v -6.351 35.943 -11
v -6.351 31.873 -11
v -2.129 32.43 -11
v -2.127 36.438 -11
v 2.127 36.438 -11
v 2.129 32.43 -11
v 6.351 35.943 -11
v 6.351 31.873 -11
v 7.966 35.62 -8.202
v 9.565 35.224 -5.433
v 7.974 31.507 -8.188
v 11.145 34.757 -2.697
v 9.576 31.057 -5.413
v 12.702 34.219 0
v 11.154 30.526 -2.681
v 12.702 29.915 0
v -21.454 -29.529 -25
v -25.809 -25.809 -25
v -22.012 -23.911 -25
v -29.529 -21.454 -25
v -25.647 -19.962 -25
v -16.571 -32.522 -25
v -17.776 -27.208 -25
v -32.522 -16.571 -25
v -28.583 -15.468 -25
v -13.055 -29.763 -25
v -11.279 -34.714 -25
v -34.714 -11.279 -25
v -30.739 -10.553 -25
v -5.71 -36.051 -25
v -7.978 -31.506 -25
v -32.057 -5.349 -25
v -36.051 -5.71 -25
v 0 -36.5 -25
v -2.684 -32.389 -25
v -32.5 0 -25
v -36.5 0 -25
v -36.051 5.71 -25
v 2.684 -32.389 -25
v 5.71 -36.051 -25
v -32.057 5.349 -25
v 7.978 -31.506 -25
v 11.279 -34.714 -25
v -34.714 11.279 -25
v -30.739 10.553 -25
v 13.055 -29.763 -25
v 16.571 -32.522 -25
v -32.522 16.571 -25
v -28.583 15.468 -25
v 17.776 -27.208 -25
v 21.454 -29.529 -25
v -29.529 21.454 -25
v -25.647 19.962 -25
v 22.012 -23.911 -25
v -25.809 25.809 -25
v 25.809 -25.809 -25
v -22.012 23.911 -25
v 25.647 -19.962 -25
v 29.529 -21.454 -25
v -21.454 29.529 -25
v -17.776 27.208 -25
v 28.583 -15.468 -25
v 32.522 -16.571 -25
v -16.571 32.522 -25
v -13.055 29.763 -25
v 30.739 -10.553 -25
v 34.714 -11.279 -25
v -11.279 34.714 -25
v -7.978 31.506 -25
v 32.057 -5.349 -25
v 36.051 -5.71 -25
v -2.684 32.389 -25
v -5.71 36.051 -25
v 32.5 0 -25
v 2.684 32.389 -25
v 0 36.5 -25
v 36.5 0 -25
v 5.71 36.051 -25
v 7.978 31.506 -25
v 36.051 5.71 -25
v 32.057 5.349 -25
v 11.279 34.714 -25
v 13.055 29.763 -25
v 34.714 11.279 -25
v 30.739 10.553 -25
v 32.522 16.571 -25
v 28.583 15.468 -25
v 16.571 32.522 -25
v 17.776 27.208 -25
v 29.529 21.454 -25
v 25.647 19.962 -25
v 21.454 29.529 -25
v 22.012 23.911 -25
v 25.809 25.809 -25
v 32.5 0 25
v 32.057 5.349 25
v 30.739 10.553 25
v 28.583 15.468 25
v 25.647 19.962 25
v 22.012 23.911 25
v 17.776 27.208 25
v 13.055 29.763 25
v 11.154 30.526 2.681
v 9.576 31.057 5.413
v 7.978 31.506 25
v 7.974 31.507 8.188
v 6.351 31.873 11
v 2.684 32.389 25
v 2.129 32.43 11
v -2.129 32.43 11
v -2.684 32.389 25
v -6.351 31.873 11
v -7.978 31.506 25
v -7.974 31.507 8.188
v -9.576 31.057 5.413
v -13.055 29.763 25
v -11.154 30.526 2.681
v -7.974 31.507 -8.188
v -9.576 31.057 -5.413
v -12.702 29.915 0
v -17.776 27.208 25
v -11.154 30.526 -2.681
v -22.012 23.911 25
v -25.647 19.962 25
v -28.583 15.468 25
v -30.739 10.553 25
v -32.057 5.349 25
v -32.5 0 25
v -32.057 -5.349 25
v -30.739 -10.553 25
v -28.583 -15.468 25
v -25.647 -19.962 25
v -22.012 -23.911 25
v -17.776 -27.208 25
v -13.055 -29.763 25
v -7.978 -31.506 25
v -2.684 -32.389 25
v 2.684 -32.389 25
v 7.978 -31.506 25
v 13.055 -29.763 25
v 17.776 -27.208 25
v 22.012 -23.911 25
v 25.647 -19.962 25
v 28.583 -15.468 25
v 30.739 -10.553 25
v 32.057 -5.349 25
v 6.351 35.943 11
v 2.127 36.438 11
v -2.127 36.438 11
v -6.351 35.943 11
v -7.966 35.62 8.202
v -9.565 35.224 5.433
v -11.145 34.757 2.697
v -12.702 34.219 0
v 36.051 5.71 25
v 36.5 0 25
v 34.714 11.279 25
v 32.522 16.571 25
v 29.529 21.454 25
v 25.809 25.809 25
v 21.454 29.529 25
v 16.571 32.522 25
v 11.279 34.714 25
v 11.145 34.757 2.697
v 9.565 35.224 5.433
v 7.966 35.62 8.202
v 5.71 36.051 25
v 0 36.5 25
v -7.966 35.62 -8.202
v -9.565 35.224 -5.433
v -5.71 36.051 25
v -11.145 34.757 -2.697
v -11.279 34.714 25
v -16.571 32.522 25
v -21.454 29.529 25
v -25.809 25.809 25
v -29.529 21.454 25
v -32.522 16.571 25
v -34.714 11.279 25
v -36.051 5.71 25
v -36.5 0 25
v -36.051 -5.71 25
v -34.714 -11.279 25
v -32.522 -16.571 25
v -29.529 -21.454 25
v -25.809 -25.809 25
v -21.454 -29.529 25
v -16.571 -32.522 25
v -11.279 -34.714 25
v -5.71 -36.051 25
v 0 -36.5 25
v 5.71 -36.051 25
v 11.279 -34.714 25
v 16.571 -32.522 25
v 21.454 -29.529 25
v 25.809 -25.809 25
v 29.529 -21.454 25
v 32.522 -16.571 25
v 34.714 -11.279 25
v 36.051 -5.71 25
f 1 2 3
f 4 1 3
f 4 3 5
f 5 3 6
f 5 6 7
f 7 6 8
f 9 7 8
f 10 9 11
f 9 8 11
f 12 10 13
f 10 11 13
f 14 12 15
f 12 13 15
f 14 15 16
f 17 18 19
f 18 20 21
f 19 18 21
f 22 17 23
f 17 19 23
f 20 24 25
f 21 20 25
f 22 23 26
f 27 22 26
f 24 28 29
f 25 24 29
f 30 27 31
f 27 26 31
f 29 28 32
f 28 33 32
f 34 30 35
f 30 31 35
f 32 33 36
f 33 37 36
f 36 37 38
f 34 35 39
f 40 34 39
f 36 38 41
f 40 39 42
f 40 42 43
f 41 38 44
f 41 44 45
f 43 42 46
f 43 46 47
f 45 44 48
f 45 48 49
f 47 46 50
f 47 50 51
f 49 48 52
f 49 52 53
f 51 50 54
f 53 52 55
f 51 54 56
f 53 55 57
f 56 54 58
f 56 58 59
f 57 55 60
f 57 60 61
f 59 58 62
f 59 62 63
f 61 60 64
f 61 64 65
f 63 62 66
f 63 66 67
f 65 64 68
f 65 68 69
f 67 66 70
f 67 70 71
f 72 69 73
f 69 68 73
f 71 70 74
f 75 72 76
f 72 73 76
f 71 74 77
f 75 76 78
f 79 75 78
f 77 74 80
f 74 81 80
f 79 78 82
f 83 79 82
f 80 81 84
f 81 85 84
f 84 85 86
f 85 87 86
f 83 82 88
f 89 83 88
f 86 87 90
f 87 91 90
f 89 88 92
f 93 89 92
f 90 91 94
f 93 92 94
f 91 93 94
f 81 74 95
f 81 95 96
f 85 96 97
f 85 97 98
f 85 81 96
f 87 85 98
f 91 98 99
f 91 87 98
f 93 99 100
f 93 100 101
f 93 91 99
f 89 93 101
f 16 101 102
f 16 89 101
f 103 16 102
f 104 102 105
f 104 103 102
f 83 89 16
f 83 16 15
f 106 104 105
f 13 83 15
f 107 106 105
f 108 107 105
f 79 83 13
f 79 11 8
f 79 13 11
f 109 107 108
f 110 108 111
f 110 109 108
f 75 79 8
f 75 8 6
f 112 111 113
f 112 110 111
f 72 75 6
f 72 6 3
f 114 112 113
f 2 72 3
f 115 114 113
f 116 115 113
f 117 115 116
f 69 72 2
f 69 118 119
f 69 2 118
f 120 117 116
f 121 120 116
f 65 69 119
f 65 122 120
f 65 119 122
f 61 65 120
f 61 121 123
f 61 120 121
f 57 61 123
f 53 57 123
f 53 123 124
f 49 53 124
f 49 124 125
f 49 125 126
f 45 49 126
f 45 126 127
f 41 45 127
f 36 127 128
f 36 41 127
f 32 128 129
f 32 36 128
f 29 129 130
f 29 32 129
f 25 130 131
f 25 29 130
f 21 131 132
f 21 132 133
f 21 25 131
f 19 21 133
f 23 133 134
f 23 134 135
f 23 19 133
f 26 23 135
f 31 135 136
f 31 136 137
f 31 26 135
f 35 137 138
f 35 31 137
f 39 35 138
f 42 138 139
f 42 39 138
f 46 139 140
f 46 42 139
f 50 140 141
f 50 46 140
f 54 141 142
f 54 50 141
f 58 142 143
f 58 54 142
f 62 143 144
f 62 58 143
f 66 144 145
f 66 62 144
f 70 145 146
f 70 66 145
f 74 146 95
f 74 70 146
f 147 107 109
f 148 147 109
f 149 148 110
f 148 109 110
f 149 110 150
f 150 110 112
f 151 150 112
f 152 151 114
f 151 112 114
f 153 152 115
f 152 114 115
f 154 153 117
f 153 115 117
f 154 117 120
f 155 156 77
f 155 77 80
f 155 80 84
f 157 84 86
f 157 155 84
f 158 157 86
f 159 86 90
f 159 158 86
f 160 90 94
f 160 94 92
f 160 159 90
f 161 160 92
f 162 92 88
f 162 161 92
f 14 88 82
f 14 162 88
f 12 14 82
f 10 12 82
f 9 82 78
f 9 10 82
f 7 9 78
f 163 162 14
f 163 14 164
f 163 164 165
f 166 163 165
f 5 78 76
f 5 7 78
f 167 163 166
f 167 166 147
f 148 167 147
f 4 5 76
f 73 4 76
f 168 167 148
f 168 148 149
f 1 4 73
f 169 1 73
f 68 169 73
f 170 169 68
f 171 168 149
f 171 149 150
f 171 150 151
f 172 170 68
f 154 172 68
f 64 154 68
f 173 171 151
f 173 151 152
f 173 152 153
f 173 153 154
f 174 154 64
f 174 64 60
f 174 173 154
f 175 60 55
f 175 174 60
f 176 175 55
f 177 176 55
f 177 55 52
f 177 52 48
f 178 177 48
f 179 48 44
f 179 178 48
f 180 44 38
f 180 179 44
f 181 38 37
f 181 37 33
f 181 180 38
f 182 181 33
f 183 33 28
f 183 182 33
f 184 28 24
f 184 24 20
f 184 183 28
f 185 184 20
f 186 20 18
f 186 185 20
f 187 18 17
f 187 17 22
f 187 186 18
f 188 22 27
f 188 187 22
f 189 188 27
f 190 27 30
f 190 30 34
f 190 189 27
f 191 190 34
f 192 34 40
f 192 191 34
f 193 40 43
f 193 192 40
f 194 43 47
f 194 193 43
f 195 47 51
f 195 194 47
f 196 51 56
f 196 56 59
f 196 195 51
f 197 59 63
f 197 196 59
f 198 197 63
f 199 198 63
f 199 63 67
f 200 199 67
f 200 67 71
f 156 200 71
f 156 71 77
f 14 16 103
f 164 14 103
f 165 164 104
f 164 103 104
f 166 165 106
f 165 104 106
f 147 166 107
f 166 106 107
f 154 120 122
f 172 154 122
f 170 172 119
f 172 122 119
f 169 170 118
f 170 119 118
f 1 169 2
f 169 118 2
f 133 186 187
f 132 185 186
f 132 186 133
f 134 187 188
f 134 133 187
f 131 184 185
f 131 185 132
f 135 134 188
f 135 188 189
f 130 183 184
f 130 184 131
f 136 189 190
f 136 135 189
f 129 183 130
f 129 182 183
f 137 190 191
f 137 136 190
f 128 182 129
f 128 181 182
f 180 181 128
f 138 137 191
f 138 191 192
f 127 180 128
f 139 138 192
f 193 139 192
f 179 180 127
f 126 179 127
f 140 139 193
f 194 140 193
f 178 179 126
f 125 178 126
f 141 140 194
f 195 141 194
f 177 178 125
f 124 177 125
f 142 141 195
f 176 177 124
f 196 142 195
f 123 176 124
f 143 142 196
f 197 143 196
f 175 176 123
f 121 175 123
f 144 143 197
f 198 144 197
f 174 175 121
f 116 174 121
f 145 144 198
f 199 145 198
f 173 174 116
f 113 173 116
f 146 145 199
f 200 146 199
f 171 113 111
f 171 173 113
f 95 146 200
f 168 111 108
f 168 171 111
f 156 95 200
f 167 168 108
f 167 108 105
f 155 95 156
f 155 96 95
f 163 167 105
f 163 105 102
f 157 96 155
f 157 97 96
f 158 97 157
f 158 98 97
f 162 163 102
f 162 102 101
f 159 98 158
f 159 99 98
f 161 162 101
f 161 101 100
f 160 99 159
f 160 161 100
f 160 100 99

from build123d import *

# Parameters (mm, degrees)
F0_R     = 36.5
F0_R_2   = 32.5
F1_DEPTH = 25
F3_DEPTH = 40


# Not quite as in the source:
# - a feature names something its author has since deleted; it is built from what else it names


with BuildPart() as f1:
    # F0 (on Top) → F1 (new body, symmetric)
    with BuildSketch(Plane.XY):
        Circle(F0_R)
        Circle(F0_R_2, mode=Mode.SUBTRACT)
    extrude(amount=F1_DEPTH, both=True)

    # F2 (on Front) → F3 (cut)
    with BuildSketch(Plane.XZ):
        Polygon((-6.3508529611, -11), (6.3508529611, -11), (12.7017059222, 0), (6.3508529611, 11), (-6.3508529611, 11), (-12.7017059222, 0), align=None)
    extrude(amount=-F3_DEPTH, mode=Mode.SUBTRACT)


solid = f1.part
